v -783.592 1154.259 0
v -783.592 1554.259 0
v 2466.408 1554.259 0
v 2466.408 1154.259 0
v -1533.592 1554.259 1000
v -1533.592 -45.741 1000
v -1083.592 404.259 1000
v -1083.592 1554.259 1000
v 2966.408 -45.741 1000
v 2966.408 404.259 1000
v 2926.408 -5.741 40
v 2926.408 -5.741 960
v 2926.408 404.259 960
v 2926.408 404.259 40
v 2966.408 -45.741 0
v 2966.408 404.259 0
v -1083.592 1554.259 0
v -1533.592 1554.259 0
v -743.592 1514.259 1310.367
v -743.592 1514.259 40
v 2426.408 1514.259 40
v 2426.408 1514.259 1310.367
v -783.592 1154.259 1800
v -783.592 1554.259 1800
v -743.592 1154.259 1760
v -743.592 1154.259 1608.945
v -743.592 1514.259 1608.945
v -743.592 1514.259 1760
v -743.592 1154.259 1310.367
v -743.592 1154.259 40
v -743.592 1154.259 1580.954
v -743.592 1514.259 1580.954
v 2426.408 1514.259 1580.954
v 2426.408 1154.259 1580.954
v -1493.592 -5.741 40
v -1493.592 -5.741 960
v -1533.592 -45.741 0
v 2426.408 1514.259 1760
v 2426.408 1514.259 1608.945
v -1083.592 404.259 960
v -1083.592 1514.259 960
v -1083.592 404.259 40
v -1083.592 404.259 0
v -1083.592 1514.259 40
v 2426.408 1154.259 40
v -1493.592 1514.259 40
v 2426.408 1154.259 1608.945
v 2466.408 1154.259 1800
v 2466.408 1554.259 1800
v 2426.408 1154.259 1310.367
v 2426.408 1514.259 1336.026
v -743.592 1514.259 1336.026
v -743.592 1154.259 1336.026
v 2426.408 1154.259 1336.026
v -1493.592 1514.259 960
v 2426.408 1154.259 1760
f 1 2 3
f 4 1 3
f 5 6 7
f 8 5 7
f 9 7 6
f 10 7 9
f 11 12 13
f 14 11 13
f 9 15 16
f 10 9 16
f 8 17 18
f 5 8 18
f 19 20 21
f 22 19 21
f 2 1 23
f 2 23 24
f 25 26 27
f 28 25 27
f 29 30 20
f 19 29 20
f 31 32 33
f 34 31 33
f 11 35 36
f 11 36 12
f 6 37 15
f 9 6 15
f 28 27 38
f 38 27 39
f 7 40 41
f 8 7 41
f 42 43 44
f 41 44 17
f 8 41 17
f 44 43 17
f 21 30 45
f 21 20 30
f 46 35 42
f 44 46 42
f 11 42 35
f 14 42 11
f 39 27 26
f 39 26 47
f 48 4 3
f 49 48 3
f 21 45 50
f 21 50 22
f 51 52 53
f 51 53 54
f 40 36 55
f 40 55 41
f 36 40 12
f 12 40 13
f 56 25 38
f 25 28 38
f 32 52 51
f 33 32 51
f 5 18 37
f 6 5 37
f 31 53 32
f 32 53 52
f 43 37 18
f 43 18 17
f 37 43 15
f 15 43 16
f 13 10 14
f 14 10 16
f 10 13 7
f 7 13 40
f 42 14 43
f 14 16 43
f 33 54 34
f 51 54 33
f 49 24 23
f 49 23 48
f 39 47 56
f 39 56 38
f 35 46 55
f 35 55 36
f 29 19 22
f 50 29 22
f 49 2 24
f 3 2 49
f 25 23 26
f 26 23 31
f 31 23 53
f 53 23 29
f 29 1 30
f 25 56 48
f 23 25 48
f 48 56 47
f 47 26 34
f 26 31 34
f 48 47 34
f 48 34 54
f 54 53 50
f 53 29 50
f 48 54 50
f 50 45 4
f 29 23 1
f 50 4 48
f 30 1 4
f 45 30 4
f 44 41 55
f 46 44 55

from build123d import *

# Parameters (mm, degrees)
F1_DEPTH = 1000
F0_W     = 3250
F0_H     = 400
F2_DEPTH = 1800
F3_T     = -40
F4_T     = -40
F5_W     = 3170
F5_H     = 25.659084
F5_H_2   = 27.991772
F6_DEPTH = 360


with BuildPart() as f1:
    # F0 (on Top) → F1 (new body)
    with BuildSketch(Plane.XY):
        Polygon((2966.408193, 404.258921), (-1083.591807, 404.258921), (-1083.591807, 1554.258921), (-1533.591807, 1554.258921), (-1533.591807, 404.258921), (-1533.591807, -45.741079), (2966.408193, -45.741079), align=None)
    extrude(amount=F1_DEPTH)

    # F4
    f4_openings = [f1.faces().sort_by_distance(p)[0] for p in [
        (941.408193, 404.258921, 500),
        (-1083.591807, 979.258921, 500),
    ]]
    offset(amount=F4_T, openings=f4_openings)


with BuildPart() as f2:
    # F0 (on Top) → F2 (new body)
    with BuildSketch(Plane.XY):
        with Locations((841.408193, 1354.258921)):
            Rectangle(F0_W, F0_H)
    extrude(amount=F2_DEPTH)

    # F3
    f3_openings = [f2.faces().sort_by_distance(p)[0] for p in [
        (841.408193, 1154.258921, 900),
    ]]
    offset(amount=F3_T, openings=f3_openings)

    # F5 (on face) → F6 (join)
    with BuildSketch(Plane.XZ.offset(-1514.258921)):
        with Locations((841.408193, 1323.196769)):
            Rectangle(F5_W, F5_H)
        with Locations((841.408193, 1594.949603)):
            Rectangle(F5_W, F5_H_2)
    extrude(amount=F6_DEPTH)


solid = Compound([f1.part, f2.part])
